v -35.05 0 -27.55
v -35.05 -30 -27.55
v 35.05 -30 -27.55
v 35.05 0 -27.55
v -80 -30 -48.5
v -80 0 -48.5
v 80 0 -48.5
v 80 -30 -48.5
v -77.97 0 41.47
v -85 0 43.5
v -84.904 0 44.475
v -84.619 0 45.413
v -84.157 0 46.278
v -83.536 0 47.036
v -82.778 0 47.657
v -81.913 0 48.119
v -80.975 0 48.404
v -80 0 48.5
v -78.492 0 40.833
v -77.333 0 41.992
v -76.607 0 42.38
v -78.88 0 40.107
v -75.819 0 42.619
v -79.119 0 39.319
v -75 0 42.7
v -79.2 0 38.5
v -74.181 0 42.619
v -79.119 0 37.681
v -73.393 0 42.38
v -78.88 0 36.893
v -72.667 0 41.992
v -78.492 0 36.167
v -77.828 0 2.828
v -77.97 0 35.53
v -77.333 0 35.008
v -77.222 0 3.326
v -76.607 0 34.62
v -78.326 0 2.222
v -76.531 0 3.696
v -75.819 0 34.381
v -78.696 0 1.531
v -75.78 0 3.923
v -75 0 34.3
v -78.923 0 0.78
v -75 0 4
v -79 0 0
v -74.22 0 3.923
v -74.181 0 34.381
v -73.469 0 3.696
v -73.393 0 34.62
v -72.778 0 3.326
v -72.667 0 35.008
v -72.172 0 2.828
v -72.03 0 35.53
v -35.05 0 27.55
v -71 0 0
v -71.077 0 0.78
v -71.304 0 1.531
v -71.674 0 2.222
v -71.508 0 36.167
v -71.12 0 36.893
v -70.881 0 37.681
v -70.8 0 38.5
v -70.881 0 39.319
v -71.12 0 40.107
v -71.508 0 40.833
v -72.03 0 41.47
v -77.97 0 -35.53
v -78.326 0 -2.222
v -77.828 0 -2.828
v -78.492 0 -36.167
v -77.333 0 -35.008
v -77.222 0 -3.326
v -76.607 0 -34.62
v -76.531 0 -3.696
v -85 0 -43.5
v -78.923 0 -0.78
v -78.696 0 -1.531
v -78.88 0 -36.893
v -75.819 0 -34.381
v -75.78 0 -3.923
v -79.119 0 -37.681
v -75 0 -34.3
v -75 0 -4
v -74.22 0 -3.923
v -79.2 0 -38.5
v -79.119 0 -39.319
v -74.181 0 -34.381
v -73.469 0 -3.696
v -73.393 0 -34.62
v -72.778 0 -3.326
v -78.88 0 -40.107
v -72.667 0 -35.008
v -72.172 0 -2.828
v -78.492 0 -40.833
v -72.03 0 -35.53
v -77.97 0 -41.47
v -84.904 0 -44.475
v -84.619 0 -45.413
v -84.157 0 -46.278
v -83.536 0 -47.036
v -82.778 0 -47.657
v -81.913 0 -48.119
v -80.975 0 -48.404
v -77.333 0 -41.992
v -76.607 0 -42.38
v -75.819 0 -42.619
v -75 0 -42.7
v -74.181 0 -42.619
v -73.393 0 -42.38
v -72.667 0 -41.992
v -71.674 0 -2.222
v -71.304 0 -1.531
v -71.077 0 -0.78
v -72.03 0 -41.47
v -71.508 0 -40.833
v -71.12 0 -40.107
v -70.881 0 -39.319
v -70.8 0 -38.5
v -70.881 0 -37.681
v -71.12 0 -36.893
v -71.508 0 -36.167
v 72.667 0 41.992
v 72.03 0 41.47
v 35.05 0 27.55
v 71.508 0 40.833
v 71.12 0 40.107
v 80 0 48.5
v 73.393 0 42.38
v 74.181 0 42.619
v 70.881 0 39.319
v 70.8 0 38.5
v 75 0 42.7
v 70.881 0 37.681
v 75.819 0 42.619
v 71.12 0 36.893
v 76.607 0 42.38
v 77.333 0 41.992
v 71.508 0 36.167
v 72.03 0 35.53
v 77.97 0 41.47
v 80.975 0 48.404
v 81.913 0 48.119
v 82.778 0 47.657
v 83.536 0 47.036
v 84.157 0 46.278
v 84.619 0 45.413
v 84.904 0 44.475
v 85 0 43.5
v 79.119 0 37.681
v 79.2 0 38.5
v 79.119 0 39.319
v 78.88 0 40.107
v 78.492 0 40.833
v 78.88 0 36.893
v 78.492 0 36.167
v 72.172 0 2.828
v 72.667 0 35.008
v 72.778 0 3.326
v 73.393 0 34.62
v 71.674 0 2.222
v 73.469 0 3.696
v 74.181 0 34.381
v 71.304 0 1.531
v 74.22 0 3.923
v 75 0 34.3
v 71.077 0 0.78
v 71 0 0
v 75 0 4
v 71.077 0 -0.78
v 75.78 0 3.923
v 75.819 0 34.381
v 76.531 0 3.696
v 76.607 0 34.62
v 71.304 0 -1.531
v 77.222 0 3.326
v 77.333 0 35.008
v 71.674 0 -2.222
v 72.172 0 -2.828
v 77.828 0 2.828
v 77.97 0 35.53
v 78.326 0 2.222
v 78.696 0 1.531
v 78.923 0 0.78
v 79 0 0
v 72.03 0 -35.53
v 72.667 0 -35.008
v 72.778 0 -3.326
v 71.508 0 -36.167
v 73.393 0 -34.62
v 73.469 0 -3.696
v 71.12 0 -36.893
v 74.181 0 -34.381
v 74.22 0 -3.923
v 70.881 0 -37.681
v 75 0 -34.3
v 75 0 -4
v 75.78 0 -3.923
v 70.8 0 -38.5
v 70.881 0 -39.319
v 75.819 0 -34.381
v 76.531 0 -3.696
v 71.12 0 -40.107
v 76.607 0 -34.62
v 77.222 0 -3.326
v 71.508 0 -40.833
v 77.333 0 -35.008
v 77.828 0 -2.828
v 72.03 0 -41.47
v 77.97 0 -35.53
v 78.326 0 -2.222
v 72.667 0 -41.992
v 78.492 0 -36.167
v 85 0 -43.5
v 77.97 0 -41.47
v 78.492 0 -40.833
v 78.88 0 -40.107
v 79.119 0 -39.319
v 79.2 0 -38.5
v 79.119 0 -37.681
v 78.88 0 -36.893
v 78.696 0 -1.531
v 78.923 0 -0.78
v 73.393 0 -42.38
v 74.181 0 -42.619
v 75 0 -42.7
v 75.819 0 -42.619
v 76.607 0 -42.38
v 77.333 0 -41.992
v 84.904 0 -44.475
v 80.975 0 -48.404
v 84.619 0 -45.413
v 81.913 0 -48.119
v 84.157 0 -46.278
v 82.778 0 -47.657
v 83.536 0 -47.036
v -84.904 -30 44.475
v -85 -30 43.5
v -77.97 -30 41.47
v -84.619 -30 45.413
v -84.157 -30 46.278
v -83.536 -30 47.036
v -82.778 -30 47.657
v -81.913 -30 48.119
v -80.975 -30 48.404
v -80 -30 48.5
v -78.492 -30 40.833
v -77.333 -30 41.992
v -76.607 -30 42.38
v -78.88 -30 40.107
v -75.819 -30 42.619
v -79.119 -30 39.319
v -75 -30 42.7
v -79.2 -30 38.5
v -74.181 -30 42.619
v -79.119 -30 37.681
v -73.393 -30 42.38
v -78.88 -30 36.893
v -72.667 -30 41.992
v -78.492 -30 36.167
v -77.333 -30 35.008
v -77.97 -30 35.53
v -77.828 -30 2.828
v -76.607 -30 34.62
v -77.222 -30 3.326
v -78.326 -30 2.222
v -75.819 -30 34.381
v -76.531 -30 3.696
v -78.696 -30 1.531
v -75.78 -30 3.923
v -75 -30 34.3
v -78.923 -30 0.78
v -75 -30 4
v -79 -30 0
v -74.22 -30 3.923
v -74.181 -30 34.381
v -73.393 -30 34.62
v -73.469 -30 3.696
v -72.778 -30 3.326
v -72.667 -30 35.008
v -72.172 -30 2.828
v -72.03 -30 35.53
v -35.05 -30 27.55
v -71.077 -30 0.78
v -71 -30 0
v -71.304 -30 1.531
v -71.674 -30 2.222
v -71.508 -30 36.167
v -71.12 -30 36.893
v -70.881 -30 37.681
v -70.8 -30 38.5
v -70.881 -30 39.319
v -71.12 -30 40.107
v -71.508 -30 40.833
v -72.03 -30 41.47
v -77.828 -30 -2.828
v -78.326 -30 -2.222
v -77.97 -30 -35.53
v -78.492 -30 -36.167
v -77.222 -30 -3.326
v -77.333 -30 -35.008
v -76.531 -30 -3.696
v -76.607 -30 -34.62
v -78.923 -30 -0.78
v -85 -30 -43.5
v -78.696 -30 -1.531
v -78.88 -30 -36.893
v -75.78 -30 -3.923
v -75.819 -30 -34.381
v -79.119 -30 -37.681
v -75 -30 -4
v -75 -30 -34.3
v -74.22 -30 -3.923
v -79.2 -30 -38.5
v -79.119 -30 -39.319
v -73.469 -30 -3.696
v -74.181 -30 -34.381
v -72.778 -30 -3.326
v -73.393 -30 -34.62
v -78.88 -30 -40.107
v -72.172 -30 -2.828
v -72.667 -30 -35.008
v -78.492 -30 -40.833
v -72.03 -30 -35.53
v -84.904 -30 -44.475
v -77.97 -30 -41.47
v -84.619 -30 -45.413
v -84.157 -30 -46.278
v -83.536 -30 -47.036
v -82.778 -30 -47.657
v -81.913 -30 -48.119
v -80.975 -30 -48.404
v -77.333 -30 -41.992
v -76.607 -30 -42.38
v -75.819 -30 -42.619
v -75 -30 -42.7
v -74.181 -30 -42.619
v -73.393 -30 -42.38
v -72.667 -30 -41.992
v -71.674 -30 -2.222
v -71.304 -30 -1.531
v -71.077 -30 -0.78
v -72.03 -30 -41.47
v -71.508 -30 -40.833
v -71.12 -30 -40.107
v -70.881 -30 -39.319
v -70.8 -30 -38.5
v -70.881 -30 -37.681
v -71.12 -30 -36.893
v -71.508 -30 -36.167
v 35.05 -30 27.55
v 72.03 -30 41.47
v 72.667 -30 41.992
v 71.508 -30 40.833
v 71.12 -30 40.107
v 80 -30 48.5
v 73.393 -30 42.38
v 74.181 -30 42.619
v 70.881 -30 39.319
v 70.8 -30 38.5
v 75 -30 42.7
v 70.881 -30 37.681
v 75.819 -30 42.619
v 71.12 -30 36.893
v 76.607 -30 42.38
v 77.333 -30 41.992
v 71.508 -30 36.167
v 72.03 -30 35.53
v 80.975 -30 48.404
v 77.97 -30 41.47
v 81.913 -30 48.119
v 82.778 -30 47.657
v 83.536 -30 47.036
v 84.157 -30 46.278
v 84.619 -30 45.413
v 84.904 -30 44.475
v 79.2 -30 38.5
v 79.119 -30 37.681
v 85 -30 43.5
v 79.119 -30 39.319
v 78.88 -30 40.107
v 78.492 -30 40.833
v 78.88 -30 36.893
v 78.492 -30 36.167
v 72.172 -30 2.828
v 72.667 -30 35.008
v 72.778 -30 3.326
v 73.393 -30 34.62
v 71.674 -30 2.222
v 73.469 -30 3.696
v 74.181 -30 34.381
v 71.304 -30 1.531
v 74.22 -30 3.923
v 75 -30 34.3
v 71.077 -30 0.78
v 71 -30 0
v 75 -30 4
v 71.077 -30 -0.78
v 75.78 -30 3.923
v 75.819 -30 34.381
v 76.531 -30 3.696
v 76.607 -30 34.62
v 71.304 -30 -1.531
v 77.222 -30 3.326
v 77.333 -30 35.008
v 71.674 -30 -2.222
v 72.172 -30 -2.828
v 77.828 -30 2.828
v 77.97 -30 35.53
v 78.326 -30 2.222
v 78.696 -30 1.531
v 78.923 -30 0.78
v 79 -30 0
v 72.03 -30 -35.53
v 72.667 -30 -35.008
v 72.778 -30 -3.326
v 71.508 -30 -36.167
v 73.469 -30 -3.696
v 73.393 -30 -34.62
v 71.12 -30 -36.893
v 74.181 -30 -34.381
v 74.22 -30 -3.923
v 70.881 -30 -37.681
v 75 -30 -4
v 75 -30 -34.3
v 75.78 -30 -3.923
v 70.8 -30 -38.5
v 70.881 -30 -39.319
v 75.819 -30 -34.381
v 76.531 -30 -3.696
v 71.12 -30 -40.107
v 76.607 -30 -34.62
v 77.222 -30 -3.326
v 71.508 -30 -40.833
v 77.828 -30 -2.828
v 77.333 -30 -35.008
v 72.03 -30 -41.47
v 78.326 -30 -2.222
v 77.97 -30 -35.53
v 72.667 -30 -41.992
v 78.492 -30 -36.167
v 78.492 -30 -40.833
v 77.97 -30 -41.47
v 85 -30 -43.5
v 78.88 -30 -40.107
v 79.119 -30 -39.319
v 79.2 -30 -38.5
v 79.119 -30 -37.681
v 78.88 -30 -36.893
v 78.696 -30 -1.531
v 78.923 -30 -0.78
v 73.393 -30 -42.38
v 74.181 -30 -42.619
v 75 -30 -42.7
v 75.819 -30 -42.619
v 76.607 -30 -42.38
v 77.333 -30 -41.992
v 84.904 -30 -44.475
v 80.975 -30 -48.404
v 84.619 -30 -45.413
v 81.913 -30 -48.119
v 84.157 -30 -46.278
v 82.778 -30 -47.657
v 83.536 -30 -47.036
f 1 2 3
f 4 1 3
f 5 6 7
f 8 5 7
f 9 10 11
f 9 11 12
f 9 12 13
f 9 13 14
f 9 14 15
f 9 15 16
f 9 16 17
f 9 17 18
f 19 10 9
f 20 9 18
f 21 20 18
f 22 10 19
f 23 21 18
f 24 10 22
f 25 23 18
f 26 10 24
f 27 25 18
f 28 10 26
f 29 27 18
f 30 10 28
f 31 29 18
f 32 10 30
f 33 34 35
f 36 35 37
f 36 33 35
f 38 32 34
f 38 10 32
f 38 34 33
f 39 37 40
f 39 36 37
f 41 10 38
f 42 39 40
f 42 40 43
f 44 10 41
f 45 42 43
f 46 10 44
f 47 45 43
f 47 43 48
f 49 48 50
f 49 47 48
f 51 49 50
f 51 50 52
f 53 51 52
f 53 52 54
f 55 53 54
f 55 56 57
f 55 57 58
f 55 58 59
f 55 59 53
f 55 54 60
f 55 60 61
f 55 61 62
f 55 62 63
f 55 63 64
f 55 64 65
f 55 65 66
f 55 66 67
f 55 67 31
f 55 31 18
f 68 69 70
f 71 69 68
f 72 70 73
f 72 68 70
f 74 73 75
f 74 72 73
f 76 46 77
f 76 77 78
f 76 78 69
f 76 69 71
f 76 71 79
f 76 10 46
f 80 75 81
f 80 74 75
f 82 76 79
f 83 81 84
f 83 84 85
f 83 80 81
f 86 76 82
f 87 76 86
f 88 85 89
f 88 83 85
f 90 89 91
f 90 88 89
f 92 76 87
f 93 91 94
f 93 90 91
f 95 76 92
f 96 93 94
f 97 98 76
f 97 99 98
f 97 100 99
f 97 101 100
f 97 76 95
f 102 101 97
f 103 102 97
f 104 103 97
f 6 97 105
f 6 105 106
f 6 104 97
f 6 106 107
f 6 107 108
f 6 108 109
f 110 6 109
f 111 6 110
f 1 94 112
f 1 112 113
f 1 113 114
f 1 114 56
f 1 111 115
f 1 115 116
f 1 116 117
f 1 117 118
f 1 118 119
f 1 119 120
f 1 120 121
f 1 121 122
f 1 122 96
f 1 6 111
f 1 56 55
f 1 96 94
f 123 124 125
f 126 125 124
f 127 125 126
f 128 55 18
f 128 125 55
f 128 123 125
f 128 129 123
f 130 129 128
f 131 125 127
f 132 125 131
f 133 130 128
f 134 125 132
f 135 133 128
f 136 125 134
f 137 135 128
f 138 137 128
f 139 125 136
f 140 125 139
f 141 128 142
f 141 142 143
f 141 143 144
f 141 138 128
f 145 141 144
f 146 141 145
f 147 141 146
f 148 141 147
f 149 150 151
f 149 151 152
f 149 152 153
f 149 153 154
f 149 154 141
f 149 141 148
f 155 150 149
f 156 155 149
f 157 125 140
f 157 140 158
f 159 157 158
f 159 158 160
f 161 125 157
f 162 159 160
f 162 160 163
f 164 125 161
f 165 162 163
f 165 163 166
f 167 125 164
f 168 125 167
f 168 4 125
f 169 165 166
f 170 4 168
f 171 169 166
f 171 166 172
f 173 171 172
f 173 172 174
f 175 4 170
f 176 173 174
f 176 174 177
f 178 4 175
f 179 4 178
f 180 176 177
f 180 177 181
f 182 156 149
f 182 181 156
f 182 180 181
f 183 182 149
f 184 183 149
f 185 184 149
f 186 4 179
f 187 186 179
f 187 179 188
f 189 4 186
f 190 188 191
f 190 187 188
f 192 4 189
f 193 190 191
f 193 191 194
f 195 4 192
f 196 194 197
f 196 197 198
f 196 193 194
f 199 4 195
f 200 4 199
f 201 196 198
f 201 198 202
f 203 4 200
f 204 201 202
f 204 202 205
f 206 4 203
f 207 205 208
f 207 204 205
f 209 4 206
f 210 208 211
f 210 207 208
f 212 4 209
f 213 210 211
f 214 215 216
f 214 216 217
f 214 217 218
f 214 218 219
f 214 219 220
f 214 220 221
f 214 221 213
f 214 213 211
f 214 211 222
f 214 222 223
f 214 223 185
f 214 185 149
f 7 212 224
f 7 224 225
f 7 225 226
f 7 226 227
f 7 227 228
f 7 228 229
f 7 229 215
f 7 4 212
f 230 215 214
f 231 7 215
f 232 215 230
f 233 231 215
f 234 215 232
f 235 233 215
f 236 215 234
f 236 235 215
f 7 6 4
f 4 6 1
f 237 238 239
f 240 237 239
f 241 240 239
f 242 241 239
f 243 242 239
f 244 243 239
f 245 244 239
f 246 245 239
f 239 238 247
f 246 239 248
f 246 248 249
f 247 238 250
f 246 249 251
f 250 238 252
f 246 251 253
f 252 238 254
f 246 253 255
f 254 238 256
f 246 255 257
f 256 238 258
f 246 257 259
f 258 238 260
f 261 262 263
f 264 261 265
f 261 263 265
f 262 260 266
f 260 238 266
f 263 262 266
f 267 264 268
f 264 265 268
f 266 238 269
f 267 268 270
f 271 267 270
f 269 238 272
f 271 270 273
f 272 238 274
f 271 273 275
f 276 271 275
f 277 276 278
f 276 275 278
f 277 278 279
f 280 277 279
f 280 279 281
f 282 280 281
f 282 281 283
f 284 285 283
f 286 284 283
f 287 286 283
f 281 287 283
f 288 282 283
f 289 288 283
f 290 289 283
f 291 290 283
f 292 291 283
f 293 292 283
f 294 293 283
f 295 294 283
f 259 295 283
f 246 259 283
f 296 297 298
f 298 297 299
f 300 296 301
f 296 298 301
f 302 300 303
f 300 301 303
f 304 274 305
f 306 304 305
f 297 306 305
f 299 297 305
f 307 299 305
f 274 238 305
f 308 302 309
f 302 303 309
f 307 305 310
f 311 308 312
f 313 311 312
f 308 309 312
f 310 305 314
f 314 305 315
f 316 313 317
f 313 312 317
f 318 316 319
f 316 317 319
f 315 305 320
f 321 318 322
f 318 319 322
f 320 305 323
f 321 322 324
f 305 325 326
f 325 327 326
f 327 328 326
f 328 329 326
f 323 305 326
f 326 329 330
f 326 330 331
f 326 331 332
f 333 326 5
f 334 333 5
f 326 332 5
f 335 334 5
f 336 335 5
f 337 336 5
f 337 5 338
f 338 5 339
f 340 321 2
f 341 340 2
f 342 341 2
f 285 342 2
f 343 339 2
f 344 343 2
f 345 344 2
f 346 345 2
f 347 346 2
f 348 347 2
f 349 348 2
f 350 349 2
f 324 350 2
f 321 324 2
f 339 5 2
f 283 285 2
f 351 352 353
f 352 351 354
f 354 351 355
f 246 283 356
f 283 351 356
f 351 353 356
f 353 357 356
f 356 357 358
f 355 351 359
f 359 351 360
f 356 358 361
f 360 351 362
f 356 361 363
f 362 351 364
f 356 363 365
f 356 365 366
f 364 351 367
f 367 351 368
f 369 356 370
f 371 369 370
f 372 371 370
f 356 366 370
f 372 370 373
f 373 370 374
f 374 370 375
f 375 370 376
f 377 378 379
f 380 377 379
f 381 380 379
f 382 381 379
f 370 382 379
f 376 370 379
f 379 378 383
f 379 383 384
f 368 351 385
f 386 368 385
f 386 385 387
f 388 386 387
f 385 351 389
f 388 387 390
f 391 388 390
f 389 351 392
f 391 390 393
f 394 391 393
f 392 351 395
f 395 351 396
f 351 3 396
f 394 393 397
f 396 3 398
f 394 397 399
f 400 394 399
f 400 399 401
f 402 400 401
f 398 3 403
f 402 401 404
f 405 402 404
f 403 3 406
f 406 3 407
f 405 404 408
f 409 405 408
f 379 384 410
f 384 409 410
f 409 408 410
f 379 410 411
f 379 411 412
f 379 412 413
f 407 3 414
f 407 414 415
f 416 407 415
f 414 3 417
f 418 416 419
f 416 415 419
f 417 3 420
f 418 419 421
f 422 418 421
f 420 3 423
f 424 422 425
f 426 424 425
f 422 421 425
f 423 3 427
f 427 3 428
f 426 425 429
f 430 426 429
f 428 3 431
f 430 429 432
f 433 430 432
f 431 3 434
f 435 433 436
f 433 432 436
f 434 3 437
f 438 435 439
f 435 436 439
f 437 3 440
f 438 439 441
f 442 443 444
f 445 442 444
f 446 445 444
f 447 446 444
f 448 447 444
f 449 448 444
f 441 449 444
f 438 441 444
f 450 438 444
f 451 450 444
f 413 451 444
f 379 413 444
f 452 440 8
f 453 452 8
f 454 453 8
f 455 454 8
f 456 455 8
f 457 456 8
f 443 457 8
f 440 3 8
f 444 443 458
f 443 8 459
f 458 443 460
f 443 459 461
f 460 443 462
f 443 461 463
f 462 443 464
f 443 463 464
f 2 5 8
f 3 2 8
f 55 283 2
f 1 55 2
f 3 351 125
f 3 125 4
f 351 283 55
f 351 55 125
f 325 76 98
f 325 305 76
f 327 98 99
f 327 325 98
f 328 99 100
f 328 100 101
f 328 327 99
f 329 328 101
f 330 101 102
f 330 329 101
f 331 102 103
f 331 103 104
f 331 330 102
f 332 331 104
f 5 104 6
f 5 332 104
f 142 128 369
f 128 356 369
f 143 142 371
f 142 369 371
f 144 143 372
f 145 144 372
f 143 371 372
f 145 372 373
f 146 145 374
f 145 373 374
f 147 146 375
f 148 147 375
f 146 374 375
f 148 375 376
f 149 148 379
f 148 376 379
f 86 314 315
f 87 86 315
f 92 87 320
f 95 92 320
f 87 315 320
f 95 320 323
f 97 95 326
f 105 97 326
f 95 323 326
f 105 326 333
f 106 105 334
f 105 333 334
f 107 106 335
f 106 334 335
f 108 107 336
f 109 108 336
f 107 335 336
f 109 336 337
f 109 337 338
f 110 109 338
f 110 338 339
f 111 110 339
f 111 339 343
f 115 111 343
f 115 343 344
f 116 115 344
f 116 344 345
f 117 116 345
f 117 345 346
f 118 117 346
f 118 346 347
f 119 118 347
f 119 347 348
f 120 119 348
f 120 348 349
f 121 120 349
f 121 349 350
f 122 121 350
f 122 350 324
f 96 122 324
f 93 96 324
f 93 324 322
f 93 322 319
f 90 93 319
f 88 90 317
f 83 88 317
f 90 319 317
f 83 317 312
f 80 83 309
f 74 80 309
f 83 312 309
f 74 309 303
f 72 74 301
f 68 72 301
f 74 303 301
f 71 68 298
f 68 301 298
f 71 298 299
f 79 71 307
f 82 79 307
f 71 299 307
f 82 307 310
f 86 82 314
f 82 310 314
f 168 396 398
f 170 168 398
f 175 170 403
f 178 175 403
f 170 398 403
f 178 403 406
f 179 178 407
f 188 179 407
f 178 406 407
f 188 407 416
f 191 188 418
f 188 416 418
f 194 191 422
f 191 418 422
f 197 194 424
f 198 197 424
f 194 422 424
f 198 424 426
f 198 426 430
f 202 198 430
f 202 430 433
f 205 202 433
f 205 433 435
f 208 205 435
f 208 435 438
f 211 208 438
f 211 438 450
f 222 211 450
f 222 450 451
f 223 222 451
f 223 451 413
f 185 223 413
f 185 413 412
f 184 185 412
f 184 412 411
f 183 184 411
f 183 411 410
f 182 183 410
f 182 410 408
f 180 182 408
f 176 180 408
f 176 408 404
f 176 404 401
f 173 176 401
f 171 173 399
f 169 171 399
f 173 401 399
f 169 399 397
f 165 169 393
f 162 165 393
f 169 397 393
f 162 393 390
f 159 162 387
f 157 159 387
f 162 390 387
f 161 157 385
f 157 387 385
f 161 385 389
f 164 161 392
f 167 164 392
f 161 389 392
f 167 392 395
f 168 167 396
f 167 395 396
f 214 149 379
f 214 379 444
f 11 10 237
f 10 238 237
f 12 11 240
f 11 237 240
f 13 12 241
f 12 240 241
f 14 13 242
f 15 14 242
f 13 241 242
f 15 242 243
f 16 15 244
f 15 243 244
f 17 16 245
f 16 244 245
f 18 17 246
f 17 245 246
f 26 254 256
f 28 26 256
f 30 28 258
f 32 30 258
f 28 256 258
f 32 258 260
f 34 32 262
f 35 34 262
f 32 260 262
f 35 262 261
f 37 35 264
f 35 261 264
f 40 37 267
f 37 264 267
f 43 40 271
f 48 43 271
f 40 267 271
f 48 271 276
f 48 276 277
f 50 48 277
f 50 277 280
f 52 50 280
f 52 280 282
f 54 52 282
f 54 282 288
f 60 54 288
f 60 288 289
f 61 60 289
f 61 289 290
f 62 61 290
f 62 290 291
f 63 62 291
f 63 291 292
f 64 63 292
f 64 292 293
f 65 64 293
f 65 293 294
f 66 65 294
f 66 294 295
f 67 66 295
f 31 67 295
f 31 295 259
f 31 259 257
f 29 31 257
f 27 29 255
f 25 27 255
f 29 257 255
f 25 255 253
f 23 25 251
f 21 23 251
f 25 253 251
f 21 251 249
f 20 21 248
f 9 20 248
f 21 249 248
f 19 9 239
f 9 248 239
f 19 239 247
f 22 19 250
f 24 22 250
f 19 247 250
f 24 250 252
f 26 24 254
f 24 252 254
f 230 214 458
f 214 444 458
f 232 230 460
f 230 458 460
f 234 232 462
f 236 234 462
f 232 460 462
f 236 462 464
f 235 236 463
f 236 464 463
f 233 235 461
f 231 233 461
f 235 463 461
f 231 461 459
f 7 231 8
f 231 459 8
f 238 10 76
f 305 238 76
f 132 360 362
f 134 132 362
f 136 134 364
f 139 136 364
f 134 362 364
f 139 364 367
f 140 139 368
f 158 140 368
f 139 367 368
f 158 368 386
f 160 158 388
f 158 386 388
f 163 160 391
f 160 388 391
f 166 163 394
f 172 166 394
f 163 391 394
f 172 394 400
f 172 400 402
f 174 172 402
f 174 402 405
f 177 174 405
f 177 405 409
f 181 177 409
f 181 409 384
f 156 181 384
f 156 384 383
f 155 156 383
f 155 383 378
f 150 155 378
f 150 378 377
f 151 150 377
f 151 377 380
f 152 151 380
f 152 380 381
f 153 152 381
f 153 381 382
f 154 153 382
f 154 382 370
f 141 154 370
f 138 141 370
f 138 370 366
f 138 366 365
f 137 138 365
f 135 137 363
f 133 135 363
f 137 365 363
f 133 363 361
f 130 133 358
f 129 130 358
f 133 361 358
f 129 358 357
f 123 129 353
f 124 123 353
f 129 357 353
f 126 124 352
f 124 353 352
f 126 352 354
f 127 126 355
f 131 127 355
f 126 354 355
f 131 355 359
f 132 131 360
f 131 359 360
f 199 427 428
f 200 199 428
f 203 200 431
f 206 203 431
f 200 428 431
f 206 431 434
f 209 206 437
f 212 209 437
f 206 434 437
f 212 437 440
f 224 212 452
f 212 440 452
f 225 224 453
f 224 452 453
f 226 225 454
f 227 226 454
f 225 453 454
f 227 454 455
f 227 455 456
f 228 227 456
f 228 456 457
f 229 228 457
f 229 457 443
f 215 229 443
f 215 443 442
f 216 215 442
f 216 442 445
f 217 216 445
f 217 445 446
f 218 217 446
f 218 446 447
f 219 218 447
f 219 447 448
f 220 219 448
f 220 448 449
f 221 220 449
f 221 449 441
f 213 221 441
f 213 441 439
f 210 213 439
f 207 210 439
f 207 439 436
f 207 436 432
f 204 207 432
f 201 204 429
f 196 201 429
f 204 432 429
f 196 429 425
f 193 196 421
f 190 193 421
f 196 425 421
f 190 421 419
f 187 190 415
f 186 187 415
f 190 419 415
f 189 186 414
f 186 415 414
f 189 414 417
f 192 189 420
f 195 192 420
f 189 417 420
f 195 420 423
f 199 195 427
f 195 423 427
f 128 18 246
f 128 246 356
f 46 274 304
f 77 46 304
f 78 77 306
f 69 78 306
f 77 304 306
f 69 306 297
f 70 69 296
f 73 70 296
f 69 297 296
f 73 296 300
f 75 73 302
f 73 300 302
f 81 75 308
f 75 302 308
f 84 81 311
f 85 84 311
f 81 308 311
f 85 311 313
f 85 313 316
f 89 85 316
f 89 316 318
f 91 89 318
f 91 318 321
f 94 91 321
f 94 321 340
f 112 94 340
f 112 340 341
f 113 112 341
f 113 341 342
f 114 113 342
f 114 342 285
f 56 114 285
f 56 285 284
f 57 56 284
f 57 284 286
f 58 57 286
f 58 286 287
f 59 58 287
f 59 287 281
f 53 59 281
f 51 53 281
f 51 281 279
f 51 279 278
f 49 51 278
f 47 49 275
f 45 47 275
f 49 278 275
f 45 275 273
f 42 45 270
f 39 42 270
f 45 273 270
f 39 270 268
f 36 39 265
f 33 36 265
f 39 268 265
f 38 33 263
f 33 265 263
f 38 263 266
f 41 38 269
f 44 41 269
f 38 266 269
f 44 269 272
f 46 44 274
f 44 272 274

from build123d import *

# Parameters (mm, degrees)
SKETCH1_W             = 170
SKETCH1_H             = 97
BOSS_EXTRUDE1_DEPTH   = 30
FILLET1_R             = 5
SKETCH2_W             = 70.1
SKETCH2_H             = 55.1
CUT_EXTRUDE3_DEPTH    = 103.358438831
F_8_0MM_DOWEL_HOLE1_D = 8
M8_CLEARANCE_HOLE1_D  = 8.4


with BuildPart() as part:
    # Sketch1 → Boss-Extrude1 (new body)
    with BuildSketch(Plane(origin=(0, 0, 0), x_dir=(1, 0, 0), z_dir=(0, 1, 0))):
        Rectangle(SKETCH1_W, SKETCH1_H)
    extrude(amount=-BOSS_EXTRUDE1_DEPTH)

    # Fillet1
    fillet1_edges = [part.edges().sort_by_distance(p)[0] for p in [
        (85, -15, 48.5),
        (-85, -15, 48.5),
        (-85, -15, -48.5),
        (85, -15, -48.5),
    ]]
    fillet(fillet1_edges, radius=FILLET1_R)

    # Sketch2 → Cut-Extrude3 (cut, through all)
    with BuildSketch(Plane(origin=(0, -30, 0), x_dir=(1, 0, 0), z_dir=(0, 1, 0))):
        Rectangle(SKETCH2_W, SKETCH2_H)
    extrude(amount=CUT_EXTRUDE3_DEPTH, mode=Mode.SUBTRACT)

    # Ø8.0mm Dowel Hole1 (through all)
    with Locations(Plane(origin=(0, 0, 0), x_dir=(1, 0, 0), z_dir=(0, 1, 0))):
        with Locations((-75, 0), (75, 0)):
            Hole(F_8_0MM_DOWEL_HOLE1_D / 2)

    # M8 Clearance Hole1 (through all)
    with Locations(Plane(origin=(0, 0, 0), x_dir=(1, 0, 0), z_dir=(0, 1, 0))):
        with Locations((-75, 38.5), (-75, -38.5), (75, -38.5), (75, 38.5)):
            Hole(M8_CLEARANCE_HOLE1_D / 2)


solid = part.part
